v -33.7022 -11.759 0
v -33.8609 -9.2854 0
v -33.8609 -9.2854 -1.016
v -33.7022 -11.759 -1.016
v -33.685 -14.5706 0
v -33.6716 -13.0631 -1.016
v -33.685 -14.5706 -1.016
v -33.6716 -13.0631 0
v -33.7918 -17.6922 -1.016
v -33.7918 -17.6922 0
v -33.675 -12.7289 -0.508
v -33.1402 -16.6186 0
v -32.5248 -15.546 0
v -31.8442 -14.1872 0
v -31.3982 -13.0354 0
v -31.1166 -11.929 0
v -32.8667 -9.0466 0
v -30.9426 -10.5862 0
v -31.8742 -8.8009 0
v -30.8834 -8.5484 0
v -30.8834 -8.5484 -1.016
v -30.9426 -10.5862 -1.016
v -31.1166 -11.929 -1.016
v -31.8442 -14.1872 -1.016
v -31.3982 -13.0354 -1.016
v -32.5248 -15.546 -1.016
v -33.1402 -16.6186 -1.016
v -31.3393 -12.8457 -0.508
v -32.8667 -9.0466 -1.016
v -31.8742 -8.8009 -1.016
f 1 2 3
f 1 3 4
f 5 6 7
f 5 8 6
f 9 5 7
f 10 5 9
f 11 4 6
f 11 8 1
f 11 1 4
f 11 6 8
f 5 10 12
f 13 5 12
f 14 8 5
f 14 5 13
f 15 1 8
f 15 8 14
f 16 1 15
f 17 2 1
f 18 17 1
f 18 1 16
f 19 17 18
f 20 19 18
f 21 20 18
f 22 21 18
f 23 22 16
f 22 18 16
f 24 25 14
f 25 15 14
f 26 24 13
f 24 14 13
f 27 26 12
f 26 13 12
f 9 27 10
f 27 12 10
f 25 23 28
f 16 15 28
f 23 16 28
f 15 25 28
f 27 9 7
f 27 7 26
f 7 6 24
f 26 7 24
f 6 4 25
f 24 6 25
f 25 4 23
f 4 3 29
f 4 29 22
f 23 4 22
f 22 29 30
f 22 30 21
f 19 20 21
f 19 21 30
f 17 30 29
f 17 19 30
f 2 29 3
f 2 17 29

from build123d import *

# Parameters (mm, degrees)
F0_R     = 0.65
F3_DEPTH = 0.9398
F5_DEPTH = 1.016


# Not quite as in the source:
# - a fillet or chamfer that OpenCascade refuses, or shapes differently, is made with other operations: its cross-section is extruded or revolved along the edge and cut away or added
# - a feature names something its author has since deleted; it is built from what else it names


with BuildPart() as f3:
    # F0 (on Top) → F3 (new body)
    with BuildSketch(Plane.XY):
        with Locations((-65.8378056469, 32.2275372886)):
            Circle(F0_R)
    extrude(amount=F3_DEPTH)

    # F4: fillet of radius 0.6 on 1 edges, made by hand

    # F4_s1 → F4_t2 (revolve, cut)
    with BuildSketch(Plane.XZ.offset(-32.2275372886)):
        with BuildLine():
            add(Edge.make_bspline(
                [(-65.1878056469, 0.3398), (-65.1878056469, 0.9398), (-65.7878056469, 0.9398)],
                knots=[0, 0, 0, 1, 1, 1], degree=2, weights=[1, 0.4285714286, 1]))
            Line((-65.7878056469, 0.9398), (-65.1878056469, 0.9398))
            Line((-65.1878056469, 0.9398), (-65.1878056469, 0.3398))
        make_face()
    revolve(axis=Axis((-65.8378056469, 32.2275372886, 0.9398), (0, 0, 1)), mode=Mode.SUBTRACT)


with BuildPart() as f5:
    # F1 (on Top) → F5 (new body)
    with BuildSketch(Plane.XY):
        with BuildLine():
            ThreePointArc((-30.8833700819, -8.5484330949), (-32.3702413361, -8.924628467), (-33.8609412709, -9.285353832))
            add(Edge.make_bspline(
                [(-33.8609412709, -9.285353832), (-33.7752337579, -10.3873432275), (-33.5955934863, -12.7868478548), (-33.721363311, -15.9607901983), (-33.7918073162, -17.6922008293)],
                knots=[0, 0, 0, 0, 0.4545759476, 1, 1, 1, 1], degree=3))
            add(Edge.make_bspline(
                [(-30.8833700819, -8.5484330949), (-30.8858372606, -10.0078512456), (-30.9439518259, -12.998153667), (-32.7959538604, -16.0707410395), (-33.7918073162, -17.6922008293)],
                knots=[0, 0, 0, 0, 0.4714457615, 1, 1, 1, 1], degree=3))
        make_face()
    extrude(amount=-F5_DEPTH)


solid = f5.part
